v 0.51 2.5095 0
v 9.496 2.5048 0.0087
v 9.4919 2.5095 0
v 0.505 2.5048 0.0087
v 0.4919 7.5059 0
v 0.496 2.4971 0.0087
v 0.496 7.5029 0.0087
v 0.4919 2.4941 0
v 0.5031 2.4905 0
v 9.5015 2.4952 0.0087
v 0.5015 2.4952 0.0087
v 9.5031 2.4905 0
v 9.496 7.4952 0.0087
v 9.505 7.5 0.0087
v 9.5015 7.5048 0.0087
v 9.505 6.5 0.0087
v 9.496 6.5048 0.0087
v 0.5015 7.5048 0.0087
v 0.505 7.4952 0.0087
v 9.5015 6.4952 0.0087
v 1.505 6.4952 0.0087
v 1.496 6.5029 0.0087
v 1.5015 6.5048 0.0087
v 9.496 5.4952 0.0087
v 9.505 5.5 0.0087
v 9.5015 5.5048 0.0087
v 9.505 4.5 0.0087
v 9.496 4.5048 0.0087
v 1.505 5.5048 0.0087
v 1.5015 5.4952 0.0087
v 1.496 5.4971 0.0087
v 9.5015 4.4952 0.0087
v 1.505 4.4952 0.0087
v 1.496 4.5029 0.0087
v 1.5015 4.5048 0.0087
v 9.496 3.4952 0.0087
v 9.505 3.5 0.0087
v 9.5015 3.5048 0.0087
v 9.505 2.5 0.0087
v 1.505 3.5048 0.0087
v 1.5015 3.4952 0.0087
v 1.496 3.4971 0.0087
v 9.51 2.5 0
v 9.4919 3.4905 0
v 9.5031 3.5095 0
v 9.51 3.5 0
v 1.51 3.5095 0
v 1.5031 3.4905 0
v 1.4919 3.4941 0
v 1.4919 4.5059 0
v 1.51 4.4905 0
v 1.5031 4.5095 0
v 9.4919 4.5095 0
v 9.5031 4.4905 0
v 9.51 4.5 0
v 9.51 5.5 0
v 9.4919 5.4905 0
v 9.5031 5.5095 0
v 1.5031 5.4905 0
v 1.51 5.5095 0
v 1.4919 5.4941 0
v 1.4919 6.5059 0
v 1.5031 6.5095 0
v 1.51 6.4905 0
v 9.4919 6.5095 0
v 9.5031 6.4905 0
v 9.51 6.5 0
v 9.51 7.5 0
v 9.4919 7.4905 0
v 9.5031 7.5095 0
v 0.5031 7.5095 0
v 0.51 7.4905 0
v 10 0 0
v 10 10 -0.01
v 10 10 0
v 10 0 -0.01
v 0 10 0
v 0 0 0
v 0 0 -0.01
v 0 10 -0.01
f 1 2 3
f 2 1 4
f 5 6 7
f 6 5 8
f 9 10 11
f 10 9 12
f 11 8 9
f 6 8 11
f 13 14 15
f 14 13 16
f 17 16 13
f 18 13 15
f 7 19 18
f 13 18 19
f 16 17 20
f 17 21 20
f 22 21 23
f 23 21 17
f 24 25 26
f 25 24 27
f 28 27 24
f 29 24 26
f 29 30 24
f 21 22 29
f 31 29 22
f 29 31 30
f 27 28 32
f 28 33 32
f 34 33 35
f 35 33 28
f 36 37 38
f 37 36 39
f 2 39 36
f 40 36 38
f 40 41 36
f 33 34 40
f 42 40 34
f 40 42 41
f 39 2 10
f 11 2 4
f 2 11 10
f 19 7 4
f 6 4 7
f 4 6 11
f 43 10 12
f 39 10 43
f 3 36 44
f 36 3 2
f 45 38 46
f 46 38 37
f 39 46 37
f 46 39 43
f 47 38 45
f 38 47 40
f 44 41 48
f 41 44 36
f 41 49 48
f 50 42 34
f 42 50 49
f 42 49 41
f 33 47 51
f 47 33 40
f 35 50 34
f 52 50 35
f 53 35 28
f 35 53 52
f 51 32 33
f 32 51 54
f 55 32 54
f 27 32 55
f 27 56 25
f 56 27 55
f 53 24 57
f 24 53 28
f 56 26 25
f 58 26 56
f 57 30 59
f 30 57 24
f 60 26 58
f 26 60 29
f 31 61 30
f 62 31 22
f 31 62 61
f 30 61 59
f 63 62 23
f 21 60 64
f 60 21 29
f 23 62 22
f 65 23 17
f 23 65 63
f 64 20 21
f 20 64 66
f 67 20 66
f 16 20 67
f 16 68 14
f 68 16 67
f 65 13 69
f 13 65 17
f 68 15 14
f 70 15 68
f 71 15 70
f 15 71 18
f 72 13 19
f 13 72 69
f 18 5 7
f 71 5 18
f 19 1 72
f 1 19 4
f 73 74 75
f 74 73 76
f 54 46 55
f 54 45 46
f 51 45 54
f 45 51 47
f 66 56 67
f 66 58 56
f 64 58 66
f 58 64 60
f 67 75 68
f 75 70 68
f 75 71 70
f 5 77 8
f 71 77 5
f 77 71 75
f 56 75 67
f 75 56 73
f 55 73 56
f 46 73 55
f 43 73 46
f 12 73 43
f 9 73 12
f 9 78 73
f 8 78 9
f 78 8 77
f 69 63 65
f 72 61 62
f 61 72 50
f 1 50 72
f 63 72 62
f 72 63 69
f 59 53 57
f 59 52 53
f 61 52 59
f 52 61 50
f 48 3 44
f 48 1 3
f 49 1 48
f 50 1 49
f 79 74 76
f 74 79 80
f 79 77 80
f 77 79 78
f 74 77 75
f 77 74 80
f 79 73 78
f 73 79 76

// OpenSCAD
hull(){
    translate([0.5, 2.5]) sphere(0.01);
    translate([1.5, 2.5]) sphere(0.01);
}
hull(){
    translate([1.5, 2.5]) sphere(0.01);
    translate([2.5, 2.5]) sphere(0.01);
}
hull(){
    translate([2.5, 2.5]) sphere(0.01);
    translate([3.5, 2.5]) sphere(0.01);
}
hull(){
    translate([3.5, 2.5]) sphere(0.01);
    translate([4.5, 2.5]) sphere(0.01);
}
hull(){
    translate([4.5, 2.5]) sphere(0.01);
    translate([5.5, 2.5]) sphere(0.01);
}
hull(){
    translate([5.5, 2.5]) sphere(0.01);
    translate([6.5, 2.5]) sphere(0.01);
}
hull(){
    translate([6.5, 2.5]) sphere(0.01);
    translate([7.5, 2.5]) sphere(0.01);
}
hull(){
    translate([7.5, 2.5]) sphere(0.01);
    translate([8.5, 2.5]) sphere(0.01);
}
hull(){
    translate([8.5, 2.5]) sphere(0.01);
    translate([9.5, 2.5]) sphere(0.01);
}
hull(){
    translate([9.5, 2.5]) sphere(0.01);
    translate([9.5, 3.5]) sphere(0.01);
}
hull(){
    translate([9.5, 3.5]) sphere(0.01);
    translate([8.5, 3.5]) sphere(0.01);
}
hull(){
    translate([8.5, 3.5]) sphere(0.01);
    translate([7.5, 3.5]) sphere(0.01);
}
hull(){
    translate([7.5, 3.5]) sphere(0.01);
    translate([6.5, 3.5]) sphere(0.01);
}
hull(){
    translate([6.5, 3.5]) sphere(0.01);
    translate([5.5, 3.5]) sphere(0.01);
}
hull(){
    translate([5.5, 3.5]) sphere(0.01);
    translate([4.5, 3.5]) sphere(0.01);
}
hull(){
    translate([4.5, 3.5]) sphere(0.01);
    translate([3.5, 3.5]) sphere(0.01);
}
hull(){
    translate([3.5, 3.5]) sphere(0.01);
    translate([2.5, 3.5]) sphere(0.01);
}
hull(){
    translate([2.5, 3.5]) sphere(0.01);
    translate([1.5, 3.5]) sphere(0.01);
}
hull(){
    translate([1.5, 3.5]) sphere(0.01);
    translate([1.5, 4.5]) sphere(0.01);
}
hull(){
    translate([1.5, 4.5]) sphere(0.01);
    translate([2.5, 4.5]) sphere(0.01);
}
hull(){
    translate([2.5, 4.5]) sphere(0.01);
    translate([3.5, 4.5]) sphere(0.01);
}
hull(){
    translate([3.5, 4.5]) sphere(0.01);
    translate([4.5, 4.5]) sphere(0.01);
}
hull(){
    translate([4.5, 4.5]) sphere(0.01);
    translate([5.5, 4.5]) sphere(0.01);
}
hull(){
    translate([5.5, 4.5]) sphere(0.01);
    translate([6.5, 4.5]) sphere(0.01);
}
hull(){
    translate([6.5, 4.5]) sphere(0.01);
    translate([7.5, 4.5]) sphere(0.01);
}
hull(){
    translate([7.5, 4.5]) sphere(0.01);
    translate([8.5, 4.5]) sphere(0.01);
}
hull(){
    translate([8.5, 4.5]) sphere(0.01);
    translate([9.5, 4.5]) sphere(0.01);
}
hull(){
    translate([9.5, 4.5]) sphere(0.01);
    translate([9.5, 5.5]) sphere(0.01);
}
hull(){
    translate([9.5, 5.5]) sphere(0.01);
    translate([8.5, 5.5]) sphere(0.01);
}
hull(){
    translate([8.5, 5.5]) sphere(0.01);
    translate([7.5, 5.5]) sphere(0.01);
}
hull(){
    translate([7.5, 5.5]) sphere(0.01);
    translate([6.5, 5.5]) sphere(0.01);
}
hull(){
    translate([6.5, 5.5]) sphere(0.01);
    translate([5.5, 5.5]) sphere(0.01);
}
hull(){
    translate([5.5, 5.5]) sphere(0.01);
    translate([4.5, 5.5]) sphere(0.01);
}
hull(){
    translate([4.5, 5.5]) sphere(0.01);
    translate([3.5, 5.5]) sphere(0.01);
}
hull(){
    translate([3.5, 5.5]) sphere(0.01);
    translate([2.5, 5.5]) sphere(0.01);
}
hull(){
    translate([2.5, 5.5]) sphere(0.01);
    translate([1.5, 5.5]) sphere(0.01);
}
hull(){
    translate([1.5, 5.5]) sphere(0.01);
    translate([1.5, 6.5]) sphere(0.01);
}
hull(){
    translate([1.5, 6.5]) sphere(0.01);
    translate([2.5, 6.5]) sphere(0.01);
}
hull(){
    translate([2.5, 6.5]) sphere(0.01);
    translate([3.5, 6.5]) sphere(0.01);
}
hull(){
    translate([3.5, 6.5]) sphere(0.01);
    translate([4.5, 6.5]) sphere(0.01);
}
hull(){
    translate([4.5, 6.5]) sphere(0.01);
    translate([5.5, 6.5]) sphere(0.01);
}
hull(){
    translate([5.5, 6.5]) sphere(0.01);
    translate([6.5, 6.5]) sphere(0.01);
}
hull(){
    translate([6.5, 6.5]) sphere(0.01);
    translate([7.5, 6.5]) sphere(0.01);
}
hull(){
    translate([7.5, 6.5]) sphere(0.01);
    translate([8.5, 6.5]) sphere(0.01);
}
hull(){
    translate([8.5, 6.5]) sphere(0.01);
    translate([9.5, 6.5]) sphere(0.01);
}
hull(){
    translate([9.5, 6.5]) sphere(0.01);
    translate([9.5, 7.5]) sphere(0.01);
}
hull(){
    translate([9.5, 7.5]) sphere(0.01);
    translate([8.5, 7.5]) sphere(0.01);
}
hull(){
    translate([8.5, 7.5]) sphere(0.01);
    translate([7.5, 7.5]) sphere(0.01);
}
hull(){
    translate([7.5, 7.5]) sphere(0.01);
    translate([6.5, 7.5]) sphere(0.01);
}
hull(){
    translate([6.5, 7.5]) sphere(0.01);
    translate([5.5, 7.5]) sphere(0.01);
}
hull(){
    translate([5.5, 7.5]) sphere(0.01);
    translate([4.5, 7.5]) sphere(0.01);
}
hull(){
    translate([4.5, 7.5]) sphere(0.01);
    translate([3.5, 7.5]) sphere(0.01);
}
hull(){
    translate([3.5, 7.5]) sphere(0.01);
    translate([2.5, 7.5]) sphere(0.01);
}
hull(){
    translate([2.5, 7.5]) sphere(0.01);
    translate([1.5, 7.5]) sphere(0.01);
}
hull(){
    translate([1.5, 7.5]) sphere(0.01);
    translate([0.5, 7.5]) sphere(0.01);
}
hull(){
    translate([0.5, 7.5]) sphere(0.01);
    translate([0.5, 6.5]) sphere(0.01);
}
hull(){
    translate([0.5, 6.5]) sphere(0.01);
    translate([0.5, 5.5]) sphere(0.01);
}
hull(){
    translate([0.5, 5.5]) sphere(0.01);
    translate([0.5, 4.5]) sphere(0.01);
}
hull(){
    translate([0.5, 4.5]) sphere(0.01);
    translate([0.5, 3.5]) sphere(0.01);
}
hull(){
    translate([0.5, 3.5]) sphere(0.01);
    translate([0.5, 2.5]) sphere(0.01);
}
translate([0,0,-0.01]) color([0.1,0.1,0.1]) cube([10,10,0.01]);
